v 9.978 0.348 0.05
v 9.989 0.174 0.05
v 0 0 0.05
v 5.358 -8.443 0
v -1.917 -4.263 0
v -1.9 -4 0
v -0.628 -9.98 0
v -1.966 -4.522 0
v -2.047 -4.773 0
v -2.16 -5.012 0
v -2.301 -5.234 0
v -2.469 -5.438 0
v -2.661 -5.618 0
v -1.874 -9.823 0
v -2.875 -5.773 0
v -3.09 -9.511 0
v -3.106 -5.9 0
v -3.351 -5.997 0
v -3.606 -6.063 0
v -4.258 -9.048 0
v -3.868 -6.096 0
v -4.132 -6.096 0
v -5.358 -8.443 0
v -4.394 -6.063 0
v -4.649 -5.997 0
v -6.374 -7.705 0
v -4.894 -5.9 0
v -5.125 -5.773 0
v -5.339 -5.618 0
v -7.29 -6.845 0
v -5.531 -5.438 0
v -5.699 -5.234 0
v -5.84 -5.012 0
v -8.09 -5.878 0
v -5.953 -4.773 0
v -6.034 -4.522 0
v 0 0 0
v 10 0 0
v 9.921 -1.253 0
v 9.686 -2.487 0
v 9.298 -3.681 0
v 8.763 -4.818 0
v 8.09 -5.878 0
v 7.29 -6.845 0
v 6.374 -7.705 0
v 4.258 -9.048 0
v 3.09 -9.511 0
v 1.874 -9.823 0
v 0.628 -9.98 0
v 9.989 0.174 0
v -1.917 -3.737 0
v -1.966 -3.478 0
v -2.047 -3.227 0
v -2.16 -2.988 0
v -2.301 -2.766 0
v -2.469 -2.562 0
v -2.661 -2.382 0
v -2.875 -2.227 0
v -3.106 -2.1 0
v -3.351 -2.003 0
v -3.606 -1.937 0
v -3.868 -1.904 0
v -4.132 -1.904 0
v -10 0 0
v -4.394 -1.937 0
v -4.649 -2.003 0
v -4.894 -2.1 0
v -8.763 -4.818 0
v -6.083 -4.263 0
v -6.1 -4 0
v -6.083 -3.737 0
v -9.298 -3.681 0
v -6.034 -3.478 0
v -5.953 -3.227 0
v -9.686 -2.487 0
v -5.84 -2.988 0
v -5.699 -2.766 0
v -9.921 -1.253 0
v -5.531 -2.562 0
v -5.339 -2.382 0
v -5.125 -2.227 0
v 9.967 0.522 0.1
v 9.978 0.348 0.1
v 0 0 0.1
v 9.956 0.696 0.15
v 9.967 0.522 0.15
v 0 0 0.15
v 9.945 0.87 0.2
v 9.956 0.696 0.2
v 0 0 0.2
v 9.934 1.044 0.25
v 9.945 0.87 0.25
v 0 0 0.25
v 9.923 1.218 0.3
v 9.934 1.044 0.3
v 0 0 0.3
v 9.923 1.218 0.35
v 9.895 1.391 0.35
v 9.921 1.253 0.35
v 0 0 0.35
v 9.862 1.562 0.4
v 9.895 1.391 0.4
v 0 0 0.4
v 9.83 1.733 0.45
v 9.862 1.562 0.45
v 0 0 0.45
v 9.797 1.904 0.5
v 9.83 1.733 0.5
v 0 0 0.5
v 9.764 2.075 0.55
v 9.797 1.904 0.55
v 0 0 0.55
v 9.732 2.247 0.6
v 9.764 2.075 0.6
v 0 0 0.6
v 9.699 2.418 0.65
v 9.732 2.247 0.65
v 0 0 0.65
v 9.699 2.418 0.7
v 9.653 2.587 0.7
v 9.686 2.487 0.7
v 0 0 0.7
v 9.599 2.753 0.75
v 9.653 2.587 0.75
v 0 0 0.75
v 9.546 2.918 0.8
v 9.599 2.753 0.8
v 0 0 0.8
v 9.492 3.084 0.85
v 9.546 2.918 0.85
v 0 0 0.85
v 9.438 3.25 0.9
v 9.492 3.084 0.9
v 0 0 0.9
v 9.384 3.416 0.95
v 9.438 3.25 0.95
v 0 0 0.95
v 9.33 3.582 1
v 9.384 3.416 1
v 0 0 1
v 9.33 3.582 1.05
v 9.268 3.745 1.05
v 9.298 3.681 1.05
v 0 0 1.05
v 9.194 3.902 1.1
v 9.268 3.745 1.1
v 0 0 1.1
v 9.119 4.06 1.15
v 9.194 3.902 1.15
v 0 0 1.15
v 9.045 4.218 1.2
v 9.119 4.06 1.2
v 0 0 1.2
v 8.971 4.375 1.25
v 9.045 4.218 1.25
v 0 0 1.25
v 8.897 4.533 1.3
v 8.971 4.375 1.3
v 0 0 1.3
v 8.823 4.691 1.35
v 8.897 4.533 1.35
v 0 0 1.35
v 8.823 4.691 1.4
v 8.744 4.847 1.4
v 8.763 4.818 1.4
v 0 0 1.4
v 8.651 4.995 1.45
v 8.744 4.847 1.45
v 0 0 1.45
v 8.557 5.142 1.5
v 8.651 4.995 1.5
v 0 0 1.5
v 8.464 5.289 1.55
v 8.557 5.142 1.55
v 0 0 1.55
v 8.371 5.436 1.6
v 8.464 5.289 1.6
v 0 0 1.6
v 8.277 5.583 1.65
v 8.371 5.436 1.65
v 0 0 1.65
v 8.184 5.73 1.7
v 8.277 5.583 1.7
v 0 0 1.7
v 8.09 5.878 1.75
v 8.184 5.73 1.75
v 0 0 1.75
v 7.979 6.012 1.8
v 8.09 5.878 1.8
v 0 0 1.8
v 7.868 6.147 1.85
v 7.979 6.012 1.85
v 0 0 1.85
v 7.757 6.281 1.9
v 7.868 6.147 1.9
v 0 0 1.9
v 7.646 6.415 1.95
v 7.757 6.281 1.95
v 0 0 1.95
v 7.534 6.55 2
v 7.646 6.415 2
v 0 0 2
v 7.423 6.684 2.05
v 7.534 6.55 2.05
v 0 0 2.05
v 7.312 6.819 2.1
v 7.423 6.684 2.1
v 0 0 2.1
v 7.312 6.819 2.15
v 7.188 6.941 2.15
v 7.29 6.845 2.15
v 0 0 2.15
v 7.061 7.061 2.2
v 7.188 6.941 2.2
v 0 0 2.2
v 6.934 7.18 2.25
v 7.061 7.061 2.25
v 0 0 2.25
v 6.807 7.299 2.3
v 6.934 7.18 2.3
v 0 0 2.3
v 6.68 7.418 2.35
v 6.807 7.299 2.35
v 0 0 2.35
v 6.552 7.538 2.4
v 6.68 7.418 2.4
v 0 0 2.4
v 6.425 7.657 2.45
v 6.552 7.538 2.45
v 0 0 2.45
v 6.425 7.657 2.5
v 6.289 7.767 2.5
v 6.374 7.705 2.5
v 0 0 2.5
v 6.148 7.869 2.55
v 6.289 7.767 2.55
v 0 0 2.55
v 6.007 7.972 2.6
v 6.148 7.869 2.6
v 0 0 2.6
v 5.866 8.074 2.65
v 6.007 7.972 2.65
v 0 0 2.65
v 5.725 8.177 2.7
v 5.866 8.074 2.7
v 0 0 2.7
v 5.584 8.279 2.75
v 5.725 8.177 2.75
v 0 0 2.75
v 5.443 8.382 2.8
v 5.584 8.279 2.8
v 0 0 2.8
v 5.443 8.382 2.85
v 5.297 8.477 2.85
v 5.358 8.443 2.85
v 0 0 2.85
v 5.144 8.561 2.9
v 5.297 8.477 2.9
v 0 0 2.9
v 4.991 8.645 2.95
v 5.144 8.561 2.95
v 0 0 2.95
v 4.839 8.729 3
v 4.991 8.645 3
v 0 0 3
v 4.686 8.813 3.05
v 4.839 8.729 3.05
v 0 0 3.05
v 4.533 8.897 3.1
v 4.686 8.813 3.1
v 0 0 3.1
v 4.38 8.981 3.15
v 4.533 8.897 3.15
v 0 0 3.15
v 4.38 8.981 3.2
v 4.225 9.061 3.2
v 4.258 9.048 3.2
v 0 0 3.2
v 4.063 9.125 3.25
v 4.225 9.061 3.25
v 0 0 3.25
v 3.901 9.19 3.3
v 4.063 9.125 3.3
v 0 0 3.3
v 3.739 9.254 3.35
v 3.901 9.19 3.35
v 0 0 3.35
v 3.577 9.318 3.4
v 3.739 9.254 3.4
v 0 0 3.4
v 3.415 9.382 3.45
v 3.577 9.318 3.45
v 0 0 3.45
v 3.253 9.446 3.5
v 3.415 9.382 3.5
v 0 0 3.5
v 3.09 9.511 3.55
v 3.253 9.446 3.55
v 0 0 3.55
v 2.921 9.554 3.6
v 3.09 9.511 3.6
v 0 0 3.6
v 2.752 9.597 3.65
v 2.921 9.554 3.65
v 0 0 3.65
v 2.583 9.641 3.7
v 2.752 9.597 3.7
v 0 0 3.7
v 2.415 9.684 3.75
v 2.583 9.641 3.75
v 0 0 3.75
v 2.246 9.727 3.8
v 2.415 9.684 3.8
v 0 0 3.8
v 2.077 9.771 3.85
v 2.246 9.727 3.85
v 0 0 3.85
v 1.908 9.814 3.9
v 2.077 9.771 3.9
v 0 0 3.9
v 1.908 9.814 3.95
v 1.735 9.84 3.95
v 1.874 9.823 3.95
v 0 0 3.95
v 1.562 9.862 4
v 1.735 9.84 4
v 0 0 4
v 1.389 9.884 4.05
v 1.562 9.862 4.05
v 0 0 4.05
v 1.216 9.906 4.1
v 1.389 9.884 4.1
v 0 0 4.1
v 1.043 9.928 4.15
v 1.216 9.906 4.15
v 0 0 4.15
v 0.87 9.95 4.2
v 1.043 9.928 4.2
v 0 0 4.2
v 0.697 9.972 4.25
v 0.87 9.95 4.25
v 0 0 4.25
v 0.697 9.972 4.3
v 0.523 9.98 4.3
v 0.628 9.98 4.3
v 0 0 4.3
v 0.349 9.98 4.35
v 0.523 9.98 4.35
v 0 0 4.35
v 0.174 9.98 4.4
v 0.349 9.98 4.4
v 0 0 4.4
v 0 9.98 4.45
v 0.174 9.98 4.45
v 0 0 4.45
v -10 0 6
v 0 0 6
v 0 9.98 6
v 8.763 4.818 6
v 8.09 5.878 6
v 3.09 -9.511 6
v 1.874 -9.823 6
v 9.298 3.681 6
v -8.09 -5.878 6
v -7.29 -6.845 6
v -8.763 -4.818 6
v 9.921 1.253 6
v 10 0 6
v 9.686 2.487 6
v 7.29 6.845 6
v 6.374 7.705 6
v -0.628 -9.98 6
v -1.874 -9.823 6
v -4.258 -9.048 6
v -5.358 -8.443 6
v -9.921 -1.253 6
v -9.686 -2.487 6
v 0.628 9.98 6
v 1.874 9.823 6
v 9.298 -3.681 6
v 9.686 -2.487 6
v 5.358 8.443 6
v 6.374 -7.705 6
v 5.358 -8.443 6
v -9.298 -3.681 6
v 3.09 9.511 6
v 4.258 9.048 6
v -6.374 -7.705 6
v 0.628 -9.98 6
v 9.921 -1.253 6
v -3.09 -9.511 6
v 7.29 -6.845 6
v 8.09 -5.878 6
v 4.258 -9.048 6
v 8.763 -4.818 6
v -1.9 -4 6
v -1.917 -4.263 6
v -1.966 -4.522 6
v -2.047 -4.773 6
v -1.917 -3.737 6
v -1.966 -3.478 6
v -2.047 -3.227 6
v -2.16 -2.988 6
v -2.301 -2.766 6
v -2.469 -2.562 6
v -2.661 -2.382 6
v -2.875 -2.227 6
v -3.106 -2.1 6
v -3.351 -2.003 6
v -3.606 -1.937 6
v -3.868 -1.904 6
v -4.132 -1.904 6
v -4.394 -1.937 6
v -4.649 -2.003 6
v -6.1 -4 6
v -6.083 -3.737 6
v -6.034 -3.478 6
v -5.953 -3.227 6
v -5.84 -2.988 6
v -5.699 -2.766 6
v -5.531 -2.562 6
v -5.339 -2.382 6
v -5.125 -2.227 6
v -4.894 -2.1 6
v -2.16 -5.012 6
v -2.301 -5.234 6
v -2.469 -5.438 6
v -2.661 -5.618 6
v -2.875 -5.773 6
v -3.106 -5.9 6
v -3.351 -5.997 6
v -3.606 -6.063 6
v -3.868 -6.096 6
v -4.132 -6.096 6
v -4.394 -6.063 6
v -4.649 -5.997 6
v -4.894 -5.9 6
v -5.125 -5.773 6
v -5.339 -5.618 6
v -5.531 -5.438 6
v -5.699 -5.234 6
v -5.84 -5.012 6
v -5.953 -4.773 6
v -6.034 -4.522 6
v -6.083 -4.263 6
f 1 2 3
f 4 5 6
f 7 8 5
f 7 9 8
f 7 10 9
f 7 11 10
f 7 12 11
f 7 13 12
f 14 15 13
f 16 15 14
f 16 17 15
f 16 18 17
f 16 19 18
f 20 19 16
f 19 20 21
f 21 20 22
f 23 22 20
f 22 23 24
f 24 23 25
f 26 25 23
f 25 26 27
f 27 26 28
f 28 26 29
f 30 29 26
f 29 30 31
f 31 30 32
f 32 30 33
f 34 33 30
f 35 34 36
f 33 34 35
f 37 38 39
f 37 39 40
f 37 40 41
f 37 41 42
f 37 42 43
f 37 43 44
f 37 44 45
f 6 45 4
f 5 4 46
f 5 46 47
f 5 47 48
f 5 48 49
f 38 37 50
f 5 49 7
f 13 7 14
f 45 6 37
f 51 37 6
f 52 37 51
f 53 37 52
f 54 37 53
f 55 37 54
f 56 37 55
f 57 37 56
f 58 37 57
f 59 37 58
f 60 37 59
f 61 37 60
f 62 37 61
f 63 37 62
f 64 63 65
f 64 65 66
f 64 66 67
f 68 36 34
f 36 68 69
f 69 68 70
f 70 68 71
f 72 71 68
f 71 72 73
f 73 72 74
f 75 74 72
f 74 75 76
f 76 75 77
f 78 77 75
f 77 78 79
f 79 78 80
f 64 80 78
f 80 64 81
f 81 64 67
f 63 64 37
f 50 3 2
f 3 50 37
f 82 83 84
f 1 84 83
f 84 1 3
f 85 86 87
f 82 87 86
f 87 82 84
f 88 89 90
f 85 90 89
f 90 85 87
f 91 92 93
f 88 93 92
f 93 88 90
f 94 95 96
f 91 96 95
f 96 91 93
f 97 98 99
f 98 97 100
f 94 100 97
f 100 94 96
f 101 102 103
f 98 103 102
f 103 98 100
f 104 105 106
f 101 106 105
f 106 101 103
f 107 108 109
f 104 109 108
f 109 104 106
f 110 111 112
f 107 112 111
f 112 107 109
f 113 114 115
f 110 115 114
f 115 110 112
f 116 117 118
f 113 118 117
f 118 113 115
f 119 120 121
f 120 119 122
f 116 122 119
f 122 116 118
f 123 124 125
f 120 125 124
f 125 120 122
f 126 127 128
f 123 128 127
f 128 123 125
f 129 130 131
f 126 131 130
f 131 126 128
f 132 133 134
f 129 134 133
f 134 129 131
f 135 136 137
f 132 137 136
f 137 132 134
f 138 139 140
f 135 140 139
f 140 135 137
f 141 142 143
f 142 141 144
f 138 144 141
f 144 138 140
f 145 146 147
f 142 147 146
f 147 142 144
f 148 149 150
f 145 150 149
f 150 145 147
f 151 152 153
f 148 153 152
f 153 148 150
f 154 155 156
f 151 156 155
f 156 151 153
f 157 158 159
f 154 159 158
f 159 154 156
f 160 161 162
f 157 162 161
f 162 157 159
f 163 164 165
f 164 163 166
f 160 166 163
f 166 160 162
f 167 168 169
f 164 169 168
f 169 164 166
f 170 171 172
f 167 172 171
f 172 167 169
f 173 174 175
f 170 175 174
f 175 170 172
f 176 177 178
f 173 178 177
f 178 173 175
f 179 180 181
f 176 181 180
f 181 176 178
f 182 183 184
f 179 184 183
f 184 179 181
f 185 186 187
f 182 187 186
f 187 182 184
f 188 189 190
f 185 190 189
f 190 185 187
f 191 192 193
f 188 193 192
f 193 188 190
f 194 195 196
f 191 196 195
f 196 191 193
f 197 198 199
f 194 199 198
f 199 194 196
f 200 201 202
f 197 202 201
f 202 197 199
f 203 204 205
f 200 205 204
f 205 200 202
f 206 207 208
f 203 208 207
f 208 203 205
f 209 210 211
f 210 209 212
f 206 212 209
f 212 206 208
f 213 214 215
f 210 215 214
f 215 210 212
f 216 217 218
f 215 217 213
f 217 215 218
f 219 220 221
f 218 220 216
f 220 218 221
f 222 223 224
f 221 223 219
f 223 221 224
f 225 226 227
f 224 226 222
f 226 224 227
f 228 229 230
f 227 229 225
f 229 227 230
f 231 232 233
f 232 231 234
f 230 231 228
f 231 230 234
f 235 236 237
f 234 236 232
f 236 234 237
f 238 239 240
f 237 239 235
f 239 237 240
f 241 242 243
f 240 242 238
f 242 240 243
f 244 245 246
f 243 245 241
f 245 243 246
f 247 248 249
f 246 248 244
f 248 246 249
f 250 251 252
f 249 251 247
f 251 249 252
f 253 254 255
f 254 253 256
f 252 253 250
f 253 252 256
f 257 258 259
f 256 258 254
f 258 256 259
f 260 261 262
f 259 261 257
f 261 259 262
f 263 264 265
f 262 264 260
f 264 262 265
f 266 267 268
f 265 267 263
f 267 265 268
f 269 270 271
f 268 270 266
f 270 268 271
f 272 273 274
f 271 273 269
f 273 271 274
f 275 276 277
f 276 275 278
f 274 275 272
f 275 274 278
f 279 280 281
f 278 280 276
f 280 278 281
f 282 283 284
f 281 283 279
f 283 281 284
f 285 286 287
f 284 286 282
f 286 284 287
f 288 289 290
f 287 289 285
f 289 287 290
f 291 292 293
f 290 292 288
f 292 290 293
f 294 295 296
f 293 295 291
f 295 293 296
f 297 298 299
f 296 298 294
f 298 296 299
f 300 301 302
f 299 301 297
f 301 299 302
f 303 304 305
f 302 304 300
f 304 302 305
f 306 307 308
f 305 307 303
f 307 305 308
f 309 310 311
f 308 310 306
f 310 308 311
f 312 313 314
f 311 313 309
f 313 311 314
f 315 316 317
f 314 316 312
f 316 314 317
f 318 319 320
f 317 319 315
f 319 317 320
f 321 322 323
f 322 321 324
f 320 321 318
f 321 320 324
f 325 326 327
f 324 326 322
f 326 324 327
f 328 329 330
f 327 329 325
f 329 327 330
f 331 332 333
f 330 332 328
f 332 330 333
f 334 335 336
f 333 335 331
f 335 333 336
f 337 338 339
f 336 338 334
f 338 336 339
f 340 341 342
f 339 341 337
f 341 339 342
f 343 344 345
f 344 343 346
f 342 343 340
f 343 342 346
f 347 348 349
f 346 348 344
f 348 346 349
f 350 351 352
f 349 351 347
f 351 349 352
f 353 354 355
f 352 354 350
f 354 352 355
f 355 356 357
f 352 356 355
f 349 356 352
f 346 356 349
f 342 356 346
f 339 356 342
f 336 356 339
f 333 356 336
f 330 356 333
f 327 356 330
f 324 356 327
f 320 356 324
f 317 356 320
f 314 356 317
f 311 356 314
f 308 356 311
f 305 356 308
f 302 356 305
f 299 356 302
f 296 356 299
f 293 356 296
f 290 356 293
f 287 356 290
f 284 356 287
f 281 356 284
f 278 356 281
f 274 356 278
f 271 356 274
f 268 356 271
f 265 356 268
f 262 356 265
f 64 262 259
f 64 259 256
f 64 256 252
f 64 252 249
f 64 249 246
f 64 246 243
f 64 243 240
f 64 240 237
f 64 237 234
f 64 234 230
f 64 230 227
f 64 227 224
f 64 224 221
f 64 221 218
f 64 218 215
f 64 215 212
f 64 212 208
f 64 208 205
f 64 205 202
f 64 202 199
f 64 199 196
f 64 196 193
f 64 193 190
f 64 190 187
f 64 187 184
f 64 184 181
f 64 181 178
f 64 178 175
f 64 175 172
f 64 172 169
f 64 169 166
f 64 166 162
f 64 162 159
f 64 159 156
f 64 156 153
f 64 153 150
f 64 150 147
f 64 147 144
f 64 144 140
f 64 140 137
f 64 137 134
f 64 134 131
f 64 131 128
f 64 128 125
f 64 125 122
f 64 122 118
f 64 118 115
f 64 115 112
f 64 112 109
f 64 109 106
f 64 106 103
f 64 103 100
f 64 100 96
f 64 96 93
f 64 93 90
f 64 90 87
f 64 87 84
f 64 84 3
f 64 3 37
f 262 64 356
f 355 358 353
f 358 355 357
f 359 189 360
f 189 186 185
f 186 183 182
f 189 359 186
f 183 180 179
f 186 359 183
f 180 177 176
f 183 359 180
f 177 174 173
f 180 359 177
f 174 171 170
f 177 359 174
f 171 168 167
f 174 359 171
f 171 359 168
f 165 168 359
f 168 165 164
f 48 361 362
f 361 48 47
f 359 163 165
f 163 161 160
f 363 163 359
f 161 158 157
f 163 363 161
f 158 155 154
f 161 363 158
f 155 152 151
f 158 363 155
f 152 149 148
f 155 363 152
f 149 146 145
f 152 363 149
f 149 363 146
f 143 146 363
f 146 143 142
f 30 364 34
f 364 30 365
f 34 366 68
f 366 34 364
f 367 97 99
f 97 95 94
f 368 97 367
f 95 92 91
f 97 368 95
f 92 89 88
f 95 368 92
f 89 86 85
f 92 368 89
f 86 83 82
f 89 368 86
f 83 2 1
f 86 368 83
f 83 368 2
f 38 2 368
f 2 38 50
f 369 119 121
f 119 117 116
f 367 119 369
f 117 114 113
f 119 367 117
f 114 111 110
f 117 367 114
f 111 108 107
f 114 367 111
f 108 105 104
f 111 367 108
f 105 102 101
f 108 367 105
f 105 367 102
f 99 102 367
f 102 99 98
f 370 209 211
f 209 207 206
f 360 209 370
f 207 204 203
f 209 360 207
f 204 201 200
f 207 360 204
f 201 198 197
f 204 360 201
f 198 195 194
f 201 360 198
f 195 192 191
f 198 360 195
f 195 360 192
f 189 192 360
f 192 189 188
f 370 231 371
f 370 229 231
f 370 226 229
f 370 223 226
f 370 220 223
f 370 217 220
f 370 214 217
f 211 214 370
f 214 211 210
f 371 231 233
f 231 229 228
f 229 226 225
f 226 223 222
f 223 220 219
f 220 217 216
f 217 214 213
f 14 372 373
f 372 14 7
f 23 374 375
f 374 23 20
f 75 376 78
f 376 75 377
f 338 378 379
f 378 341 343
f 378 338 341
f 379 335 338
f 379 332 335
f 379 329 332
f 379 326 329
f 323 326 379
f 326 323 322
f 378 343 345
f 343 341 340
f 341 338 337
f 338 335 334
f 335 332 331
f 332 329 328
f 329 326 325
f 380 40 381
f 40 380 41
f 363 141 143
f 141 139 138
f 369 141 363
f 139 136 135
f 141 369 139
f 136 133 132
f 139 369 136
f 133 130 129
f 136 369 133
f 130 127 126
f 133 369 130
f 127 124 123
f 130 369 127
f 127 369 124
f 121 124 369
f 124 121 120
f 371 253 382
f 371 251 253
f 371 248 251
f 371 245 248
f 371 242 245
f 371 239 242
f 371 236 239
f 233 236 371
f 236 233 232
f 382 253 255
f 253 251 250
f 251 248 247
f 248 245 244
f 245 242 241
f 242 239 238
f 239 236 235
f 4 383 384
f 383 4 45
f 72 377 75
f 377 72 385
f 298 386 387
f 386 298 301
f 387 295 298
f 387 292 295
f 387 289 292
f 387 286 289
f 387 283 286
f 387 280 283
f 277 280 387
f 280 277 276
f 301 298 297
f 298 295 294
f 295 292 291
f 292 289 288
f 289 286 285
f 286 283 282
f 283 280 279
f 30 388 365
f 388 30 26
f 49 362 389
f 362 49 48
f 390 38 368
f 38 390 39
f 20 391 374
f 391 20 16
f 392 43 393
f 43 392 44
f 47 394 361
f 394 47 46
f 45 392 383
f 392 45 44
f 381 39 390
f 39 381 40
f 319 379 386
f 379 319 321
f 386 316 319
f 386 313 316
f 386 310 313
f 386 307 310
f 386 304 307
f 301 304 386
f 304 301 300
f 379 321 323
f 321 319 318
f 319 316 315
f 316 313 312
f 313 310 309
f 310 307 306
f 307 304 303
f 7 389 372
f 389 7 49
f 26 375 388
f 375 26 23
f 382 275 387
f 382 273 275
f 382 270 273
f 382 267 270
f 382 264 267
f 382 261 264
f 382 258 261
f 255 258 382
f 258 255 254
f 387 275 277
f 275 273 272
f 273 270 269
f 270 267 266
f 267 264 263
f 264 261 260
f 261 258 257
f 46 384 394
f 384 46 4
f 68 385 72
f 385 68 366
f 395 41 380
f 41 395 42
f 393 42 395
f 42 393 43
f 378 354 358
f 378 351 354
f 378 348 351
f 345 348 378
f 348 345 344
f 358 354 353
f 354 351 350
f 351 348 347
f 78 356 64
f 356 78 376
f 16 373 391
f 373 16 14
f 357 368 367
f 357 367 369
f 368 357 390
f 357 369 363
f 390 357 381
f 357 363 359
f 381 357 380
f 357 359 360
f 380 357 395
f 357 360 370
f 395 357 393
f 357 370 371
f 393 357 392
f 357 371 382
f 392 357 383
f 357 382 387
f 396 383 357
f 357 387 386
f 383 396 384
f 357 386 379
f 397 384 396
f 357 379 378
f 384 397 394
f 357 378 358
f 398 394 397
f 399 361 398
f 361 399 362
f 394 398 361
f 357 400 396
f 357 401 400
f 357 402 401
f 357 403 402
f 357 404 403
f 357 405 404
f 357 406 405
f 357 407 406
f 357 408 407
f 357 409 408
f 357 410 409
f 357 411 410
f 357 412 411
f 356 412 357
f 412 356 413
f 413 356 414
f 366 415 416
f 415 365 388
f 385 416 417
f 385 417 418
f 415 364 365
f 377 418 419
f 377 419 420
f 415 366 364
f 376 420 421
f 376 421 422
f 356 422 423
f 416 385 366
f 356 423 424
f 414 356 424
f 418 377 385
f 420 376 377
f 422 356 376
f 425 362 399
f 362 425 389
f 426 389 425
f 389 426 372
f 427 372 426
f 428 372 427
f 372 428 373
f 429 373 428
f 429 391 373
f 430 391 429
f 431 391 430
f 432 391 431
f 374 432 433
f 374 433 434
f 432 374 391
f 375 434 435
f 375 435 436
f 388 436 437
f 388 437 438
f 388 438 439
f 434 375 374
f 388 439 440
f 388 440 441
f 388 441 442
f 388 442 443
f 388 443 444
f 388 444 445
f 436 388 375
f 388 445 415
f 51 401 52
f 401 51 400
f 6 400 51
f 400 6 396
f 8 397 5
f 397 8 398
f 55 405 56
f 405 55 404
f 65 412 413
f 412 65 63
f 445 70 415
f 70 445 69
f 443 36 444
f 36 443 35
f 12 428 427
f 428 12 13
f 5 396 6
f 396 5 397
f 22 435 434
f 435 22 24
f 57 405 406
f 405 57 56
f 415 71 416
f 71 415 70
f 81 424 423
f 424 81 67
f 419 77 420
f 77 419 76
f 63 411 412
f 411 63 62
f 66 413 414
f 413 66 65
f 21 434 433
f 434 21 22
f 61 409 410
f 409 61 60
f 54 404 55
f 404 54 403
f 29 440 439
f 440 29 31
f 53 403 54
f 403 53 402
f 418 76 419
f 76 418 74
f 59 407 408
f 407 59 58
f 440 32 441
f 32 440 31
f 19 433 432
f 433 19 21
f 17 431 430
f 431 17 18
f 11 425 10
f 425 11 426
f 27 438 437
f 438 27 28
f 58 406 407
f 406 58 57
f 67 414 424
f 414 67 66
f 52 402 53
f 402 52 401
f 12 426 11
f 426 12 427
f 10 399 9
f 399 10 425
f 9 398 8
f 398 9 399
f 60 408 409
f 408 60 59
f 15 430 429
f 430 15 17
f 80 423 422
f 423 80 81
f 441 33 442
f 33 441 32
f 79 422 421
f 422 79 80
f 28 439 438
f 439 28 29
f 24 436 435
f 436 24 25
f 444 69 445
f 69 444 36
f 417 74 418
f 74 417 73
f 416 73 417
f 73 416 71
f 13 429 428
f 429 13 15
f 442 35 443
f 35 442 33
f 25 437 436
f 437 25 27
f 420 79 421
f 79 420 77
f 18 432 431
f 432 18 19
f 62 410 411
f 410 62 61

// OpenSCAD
$fn=50;

radius = 10;
height = 6;

difference(){
    cylinder(r=radius,h=height);
 for (a =[0:1:90]){
     rotate(a) translate([0,0,0]) cube([radius,radius,a/20]);
 }
    translate([((-radius/2)+1),((-radius/2)+1),0]) cylinder(r=2.1,h=9);
    translate([-radius,0,0]) cube([radius,radius,radius]);
 }
